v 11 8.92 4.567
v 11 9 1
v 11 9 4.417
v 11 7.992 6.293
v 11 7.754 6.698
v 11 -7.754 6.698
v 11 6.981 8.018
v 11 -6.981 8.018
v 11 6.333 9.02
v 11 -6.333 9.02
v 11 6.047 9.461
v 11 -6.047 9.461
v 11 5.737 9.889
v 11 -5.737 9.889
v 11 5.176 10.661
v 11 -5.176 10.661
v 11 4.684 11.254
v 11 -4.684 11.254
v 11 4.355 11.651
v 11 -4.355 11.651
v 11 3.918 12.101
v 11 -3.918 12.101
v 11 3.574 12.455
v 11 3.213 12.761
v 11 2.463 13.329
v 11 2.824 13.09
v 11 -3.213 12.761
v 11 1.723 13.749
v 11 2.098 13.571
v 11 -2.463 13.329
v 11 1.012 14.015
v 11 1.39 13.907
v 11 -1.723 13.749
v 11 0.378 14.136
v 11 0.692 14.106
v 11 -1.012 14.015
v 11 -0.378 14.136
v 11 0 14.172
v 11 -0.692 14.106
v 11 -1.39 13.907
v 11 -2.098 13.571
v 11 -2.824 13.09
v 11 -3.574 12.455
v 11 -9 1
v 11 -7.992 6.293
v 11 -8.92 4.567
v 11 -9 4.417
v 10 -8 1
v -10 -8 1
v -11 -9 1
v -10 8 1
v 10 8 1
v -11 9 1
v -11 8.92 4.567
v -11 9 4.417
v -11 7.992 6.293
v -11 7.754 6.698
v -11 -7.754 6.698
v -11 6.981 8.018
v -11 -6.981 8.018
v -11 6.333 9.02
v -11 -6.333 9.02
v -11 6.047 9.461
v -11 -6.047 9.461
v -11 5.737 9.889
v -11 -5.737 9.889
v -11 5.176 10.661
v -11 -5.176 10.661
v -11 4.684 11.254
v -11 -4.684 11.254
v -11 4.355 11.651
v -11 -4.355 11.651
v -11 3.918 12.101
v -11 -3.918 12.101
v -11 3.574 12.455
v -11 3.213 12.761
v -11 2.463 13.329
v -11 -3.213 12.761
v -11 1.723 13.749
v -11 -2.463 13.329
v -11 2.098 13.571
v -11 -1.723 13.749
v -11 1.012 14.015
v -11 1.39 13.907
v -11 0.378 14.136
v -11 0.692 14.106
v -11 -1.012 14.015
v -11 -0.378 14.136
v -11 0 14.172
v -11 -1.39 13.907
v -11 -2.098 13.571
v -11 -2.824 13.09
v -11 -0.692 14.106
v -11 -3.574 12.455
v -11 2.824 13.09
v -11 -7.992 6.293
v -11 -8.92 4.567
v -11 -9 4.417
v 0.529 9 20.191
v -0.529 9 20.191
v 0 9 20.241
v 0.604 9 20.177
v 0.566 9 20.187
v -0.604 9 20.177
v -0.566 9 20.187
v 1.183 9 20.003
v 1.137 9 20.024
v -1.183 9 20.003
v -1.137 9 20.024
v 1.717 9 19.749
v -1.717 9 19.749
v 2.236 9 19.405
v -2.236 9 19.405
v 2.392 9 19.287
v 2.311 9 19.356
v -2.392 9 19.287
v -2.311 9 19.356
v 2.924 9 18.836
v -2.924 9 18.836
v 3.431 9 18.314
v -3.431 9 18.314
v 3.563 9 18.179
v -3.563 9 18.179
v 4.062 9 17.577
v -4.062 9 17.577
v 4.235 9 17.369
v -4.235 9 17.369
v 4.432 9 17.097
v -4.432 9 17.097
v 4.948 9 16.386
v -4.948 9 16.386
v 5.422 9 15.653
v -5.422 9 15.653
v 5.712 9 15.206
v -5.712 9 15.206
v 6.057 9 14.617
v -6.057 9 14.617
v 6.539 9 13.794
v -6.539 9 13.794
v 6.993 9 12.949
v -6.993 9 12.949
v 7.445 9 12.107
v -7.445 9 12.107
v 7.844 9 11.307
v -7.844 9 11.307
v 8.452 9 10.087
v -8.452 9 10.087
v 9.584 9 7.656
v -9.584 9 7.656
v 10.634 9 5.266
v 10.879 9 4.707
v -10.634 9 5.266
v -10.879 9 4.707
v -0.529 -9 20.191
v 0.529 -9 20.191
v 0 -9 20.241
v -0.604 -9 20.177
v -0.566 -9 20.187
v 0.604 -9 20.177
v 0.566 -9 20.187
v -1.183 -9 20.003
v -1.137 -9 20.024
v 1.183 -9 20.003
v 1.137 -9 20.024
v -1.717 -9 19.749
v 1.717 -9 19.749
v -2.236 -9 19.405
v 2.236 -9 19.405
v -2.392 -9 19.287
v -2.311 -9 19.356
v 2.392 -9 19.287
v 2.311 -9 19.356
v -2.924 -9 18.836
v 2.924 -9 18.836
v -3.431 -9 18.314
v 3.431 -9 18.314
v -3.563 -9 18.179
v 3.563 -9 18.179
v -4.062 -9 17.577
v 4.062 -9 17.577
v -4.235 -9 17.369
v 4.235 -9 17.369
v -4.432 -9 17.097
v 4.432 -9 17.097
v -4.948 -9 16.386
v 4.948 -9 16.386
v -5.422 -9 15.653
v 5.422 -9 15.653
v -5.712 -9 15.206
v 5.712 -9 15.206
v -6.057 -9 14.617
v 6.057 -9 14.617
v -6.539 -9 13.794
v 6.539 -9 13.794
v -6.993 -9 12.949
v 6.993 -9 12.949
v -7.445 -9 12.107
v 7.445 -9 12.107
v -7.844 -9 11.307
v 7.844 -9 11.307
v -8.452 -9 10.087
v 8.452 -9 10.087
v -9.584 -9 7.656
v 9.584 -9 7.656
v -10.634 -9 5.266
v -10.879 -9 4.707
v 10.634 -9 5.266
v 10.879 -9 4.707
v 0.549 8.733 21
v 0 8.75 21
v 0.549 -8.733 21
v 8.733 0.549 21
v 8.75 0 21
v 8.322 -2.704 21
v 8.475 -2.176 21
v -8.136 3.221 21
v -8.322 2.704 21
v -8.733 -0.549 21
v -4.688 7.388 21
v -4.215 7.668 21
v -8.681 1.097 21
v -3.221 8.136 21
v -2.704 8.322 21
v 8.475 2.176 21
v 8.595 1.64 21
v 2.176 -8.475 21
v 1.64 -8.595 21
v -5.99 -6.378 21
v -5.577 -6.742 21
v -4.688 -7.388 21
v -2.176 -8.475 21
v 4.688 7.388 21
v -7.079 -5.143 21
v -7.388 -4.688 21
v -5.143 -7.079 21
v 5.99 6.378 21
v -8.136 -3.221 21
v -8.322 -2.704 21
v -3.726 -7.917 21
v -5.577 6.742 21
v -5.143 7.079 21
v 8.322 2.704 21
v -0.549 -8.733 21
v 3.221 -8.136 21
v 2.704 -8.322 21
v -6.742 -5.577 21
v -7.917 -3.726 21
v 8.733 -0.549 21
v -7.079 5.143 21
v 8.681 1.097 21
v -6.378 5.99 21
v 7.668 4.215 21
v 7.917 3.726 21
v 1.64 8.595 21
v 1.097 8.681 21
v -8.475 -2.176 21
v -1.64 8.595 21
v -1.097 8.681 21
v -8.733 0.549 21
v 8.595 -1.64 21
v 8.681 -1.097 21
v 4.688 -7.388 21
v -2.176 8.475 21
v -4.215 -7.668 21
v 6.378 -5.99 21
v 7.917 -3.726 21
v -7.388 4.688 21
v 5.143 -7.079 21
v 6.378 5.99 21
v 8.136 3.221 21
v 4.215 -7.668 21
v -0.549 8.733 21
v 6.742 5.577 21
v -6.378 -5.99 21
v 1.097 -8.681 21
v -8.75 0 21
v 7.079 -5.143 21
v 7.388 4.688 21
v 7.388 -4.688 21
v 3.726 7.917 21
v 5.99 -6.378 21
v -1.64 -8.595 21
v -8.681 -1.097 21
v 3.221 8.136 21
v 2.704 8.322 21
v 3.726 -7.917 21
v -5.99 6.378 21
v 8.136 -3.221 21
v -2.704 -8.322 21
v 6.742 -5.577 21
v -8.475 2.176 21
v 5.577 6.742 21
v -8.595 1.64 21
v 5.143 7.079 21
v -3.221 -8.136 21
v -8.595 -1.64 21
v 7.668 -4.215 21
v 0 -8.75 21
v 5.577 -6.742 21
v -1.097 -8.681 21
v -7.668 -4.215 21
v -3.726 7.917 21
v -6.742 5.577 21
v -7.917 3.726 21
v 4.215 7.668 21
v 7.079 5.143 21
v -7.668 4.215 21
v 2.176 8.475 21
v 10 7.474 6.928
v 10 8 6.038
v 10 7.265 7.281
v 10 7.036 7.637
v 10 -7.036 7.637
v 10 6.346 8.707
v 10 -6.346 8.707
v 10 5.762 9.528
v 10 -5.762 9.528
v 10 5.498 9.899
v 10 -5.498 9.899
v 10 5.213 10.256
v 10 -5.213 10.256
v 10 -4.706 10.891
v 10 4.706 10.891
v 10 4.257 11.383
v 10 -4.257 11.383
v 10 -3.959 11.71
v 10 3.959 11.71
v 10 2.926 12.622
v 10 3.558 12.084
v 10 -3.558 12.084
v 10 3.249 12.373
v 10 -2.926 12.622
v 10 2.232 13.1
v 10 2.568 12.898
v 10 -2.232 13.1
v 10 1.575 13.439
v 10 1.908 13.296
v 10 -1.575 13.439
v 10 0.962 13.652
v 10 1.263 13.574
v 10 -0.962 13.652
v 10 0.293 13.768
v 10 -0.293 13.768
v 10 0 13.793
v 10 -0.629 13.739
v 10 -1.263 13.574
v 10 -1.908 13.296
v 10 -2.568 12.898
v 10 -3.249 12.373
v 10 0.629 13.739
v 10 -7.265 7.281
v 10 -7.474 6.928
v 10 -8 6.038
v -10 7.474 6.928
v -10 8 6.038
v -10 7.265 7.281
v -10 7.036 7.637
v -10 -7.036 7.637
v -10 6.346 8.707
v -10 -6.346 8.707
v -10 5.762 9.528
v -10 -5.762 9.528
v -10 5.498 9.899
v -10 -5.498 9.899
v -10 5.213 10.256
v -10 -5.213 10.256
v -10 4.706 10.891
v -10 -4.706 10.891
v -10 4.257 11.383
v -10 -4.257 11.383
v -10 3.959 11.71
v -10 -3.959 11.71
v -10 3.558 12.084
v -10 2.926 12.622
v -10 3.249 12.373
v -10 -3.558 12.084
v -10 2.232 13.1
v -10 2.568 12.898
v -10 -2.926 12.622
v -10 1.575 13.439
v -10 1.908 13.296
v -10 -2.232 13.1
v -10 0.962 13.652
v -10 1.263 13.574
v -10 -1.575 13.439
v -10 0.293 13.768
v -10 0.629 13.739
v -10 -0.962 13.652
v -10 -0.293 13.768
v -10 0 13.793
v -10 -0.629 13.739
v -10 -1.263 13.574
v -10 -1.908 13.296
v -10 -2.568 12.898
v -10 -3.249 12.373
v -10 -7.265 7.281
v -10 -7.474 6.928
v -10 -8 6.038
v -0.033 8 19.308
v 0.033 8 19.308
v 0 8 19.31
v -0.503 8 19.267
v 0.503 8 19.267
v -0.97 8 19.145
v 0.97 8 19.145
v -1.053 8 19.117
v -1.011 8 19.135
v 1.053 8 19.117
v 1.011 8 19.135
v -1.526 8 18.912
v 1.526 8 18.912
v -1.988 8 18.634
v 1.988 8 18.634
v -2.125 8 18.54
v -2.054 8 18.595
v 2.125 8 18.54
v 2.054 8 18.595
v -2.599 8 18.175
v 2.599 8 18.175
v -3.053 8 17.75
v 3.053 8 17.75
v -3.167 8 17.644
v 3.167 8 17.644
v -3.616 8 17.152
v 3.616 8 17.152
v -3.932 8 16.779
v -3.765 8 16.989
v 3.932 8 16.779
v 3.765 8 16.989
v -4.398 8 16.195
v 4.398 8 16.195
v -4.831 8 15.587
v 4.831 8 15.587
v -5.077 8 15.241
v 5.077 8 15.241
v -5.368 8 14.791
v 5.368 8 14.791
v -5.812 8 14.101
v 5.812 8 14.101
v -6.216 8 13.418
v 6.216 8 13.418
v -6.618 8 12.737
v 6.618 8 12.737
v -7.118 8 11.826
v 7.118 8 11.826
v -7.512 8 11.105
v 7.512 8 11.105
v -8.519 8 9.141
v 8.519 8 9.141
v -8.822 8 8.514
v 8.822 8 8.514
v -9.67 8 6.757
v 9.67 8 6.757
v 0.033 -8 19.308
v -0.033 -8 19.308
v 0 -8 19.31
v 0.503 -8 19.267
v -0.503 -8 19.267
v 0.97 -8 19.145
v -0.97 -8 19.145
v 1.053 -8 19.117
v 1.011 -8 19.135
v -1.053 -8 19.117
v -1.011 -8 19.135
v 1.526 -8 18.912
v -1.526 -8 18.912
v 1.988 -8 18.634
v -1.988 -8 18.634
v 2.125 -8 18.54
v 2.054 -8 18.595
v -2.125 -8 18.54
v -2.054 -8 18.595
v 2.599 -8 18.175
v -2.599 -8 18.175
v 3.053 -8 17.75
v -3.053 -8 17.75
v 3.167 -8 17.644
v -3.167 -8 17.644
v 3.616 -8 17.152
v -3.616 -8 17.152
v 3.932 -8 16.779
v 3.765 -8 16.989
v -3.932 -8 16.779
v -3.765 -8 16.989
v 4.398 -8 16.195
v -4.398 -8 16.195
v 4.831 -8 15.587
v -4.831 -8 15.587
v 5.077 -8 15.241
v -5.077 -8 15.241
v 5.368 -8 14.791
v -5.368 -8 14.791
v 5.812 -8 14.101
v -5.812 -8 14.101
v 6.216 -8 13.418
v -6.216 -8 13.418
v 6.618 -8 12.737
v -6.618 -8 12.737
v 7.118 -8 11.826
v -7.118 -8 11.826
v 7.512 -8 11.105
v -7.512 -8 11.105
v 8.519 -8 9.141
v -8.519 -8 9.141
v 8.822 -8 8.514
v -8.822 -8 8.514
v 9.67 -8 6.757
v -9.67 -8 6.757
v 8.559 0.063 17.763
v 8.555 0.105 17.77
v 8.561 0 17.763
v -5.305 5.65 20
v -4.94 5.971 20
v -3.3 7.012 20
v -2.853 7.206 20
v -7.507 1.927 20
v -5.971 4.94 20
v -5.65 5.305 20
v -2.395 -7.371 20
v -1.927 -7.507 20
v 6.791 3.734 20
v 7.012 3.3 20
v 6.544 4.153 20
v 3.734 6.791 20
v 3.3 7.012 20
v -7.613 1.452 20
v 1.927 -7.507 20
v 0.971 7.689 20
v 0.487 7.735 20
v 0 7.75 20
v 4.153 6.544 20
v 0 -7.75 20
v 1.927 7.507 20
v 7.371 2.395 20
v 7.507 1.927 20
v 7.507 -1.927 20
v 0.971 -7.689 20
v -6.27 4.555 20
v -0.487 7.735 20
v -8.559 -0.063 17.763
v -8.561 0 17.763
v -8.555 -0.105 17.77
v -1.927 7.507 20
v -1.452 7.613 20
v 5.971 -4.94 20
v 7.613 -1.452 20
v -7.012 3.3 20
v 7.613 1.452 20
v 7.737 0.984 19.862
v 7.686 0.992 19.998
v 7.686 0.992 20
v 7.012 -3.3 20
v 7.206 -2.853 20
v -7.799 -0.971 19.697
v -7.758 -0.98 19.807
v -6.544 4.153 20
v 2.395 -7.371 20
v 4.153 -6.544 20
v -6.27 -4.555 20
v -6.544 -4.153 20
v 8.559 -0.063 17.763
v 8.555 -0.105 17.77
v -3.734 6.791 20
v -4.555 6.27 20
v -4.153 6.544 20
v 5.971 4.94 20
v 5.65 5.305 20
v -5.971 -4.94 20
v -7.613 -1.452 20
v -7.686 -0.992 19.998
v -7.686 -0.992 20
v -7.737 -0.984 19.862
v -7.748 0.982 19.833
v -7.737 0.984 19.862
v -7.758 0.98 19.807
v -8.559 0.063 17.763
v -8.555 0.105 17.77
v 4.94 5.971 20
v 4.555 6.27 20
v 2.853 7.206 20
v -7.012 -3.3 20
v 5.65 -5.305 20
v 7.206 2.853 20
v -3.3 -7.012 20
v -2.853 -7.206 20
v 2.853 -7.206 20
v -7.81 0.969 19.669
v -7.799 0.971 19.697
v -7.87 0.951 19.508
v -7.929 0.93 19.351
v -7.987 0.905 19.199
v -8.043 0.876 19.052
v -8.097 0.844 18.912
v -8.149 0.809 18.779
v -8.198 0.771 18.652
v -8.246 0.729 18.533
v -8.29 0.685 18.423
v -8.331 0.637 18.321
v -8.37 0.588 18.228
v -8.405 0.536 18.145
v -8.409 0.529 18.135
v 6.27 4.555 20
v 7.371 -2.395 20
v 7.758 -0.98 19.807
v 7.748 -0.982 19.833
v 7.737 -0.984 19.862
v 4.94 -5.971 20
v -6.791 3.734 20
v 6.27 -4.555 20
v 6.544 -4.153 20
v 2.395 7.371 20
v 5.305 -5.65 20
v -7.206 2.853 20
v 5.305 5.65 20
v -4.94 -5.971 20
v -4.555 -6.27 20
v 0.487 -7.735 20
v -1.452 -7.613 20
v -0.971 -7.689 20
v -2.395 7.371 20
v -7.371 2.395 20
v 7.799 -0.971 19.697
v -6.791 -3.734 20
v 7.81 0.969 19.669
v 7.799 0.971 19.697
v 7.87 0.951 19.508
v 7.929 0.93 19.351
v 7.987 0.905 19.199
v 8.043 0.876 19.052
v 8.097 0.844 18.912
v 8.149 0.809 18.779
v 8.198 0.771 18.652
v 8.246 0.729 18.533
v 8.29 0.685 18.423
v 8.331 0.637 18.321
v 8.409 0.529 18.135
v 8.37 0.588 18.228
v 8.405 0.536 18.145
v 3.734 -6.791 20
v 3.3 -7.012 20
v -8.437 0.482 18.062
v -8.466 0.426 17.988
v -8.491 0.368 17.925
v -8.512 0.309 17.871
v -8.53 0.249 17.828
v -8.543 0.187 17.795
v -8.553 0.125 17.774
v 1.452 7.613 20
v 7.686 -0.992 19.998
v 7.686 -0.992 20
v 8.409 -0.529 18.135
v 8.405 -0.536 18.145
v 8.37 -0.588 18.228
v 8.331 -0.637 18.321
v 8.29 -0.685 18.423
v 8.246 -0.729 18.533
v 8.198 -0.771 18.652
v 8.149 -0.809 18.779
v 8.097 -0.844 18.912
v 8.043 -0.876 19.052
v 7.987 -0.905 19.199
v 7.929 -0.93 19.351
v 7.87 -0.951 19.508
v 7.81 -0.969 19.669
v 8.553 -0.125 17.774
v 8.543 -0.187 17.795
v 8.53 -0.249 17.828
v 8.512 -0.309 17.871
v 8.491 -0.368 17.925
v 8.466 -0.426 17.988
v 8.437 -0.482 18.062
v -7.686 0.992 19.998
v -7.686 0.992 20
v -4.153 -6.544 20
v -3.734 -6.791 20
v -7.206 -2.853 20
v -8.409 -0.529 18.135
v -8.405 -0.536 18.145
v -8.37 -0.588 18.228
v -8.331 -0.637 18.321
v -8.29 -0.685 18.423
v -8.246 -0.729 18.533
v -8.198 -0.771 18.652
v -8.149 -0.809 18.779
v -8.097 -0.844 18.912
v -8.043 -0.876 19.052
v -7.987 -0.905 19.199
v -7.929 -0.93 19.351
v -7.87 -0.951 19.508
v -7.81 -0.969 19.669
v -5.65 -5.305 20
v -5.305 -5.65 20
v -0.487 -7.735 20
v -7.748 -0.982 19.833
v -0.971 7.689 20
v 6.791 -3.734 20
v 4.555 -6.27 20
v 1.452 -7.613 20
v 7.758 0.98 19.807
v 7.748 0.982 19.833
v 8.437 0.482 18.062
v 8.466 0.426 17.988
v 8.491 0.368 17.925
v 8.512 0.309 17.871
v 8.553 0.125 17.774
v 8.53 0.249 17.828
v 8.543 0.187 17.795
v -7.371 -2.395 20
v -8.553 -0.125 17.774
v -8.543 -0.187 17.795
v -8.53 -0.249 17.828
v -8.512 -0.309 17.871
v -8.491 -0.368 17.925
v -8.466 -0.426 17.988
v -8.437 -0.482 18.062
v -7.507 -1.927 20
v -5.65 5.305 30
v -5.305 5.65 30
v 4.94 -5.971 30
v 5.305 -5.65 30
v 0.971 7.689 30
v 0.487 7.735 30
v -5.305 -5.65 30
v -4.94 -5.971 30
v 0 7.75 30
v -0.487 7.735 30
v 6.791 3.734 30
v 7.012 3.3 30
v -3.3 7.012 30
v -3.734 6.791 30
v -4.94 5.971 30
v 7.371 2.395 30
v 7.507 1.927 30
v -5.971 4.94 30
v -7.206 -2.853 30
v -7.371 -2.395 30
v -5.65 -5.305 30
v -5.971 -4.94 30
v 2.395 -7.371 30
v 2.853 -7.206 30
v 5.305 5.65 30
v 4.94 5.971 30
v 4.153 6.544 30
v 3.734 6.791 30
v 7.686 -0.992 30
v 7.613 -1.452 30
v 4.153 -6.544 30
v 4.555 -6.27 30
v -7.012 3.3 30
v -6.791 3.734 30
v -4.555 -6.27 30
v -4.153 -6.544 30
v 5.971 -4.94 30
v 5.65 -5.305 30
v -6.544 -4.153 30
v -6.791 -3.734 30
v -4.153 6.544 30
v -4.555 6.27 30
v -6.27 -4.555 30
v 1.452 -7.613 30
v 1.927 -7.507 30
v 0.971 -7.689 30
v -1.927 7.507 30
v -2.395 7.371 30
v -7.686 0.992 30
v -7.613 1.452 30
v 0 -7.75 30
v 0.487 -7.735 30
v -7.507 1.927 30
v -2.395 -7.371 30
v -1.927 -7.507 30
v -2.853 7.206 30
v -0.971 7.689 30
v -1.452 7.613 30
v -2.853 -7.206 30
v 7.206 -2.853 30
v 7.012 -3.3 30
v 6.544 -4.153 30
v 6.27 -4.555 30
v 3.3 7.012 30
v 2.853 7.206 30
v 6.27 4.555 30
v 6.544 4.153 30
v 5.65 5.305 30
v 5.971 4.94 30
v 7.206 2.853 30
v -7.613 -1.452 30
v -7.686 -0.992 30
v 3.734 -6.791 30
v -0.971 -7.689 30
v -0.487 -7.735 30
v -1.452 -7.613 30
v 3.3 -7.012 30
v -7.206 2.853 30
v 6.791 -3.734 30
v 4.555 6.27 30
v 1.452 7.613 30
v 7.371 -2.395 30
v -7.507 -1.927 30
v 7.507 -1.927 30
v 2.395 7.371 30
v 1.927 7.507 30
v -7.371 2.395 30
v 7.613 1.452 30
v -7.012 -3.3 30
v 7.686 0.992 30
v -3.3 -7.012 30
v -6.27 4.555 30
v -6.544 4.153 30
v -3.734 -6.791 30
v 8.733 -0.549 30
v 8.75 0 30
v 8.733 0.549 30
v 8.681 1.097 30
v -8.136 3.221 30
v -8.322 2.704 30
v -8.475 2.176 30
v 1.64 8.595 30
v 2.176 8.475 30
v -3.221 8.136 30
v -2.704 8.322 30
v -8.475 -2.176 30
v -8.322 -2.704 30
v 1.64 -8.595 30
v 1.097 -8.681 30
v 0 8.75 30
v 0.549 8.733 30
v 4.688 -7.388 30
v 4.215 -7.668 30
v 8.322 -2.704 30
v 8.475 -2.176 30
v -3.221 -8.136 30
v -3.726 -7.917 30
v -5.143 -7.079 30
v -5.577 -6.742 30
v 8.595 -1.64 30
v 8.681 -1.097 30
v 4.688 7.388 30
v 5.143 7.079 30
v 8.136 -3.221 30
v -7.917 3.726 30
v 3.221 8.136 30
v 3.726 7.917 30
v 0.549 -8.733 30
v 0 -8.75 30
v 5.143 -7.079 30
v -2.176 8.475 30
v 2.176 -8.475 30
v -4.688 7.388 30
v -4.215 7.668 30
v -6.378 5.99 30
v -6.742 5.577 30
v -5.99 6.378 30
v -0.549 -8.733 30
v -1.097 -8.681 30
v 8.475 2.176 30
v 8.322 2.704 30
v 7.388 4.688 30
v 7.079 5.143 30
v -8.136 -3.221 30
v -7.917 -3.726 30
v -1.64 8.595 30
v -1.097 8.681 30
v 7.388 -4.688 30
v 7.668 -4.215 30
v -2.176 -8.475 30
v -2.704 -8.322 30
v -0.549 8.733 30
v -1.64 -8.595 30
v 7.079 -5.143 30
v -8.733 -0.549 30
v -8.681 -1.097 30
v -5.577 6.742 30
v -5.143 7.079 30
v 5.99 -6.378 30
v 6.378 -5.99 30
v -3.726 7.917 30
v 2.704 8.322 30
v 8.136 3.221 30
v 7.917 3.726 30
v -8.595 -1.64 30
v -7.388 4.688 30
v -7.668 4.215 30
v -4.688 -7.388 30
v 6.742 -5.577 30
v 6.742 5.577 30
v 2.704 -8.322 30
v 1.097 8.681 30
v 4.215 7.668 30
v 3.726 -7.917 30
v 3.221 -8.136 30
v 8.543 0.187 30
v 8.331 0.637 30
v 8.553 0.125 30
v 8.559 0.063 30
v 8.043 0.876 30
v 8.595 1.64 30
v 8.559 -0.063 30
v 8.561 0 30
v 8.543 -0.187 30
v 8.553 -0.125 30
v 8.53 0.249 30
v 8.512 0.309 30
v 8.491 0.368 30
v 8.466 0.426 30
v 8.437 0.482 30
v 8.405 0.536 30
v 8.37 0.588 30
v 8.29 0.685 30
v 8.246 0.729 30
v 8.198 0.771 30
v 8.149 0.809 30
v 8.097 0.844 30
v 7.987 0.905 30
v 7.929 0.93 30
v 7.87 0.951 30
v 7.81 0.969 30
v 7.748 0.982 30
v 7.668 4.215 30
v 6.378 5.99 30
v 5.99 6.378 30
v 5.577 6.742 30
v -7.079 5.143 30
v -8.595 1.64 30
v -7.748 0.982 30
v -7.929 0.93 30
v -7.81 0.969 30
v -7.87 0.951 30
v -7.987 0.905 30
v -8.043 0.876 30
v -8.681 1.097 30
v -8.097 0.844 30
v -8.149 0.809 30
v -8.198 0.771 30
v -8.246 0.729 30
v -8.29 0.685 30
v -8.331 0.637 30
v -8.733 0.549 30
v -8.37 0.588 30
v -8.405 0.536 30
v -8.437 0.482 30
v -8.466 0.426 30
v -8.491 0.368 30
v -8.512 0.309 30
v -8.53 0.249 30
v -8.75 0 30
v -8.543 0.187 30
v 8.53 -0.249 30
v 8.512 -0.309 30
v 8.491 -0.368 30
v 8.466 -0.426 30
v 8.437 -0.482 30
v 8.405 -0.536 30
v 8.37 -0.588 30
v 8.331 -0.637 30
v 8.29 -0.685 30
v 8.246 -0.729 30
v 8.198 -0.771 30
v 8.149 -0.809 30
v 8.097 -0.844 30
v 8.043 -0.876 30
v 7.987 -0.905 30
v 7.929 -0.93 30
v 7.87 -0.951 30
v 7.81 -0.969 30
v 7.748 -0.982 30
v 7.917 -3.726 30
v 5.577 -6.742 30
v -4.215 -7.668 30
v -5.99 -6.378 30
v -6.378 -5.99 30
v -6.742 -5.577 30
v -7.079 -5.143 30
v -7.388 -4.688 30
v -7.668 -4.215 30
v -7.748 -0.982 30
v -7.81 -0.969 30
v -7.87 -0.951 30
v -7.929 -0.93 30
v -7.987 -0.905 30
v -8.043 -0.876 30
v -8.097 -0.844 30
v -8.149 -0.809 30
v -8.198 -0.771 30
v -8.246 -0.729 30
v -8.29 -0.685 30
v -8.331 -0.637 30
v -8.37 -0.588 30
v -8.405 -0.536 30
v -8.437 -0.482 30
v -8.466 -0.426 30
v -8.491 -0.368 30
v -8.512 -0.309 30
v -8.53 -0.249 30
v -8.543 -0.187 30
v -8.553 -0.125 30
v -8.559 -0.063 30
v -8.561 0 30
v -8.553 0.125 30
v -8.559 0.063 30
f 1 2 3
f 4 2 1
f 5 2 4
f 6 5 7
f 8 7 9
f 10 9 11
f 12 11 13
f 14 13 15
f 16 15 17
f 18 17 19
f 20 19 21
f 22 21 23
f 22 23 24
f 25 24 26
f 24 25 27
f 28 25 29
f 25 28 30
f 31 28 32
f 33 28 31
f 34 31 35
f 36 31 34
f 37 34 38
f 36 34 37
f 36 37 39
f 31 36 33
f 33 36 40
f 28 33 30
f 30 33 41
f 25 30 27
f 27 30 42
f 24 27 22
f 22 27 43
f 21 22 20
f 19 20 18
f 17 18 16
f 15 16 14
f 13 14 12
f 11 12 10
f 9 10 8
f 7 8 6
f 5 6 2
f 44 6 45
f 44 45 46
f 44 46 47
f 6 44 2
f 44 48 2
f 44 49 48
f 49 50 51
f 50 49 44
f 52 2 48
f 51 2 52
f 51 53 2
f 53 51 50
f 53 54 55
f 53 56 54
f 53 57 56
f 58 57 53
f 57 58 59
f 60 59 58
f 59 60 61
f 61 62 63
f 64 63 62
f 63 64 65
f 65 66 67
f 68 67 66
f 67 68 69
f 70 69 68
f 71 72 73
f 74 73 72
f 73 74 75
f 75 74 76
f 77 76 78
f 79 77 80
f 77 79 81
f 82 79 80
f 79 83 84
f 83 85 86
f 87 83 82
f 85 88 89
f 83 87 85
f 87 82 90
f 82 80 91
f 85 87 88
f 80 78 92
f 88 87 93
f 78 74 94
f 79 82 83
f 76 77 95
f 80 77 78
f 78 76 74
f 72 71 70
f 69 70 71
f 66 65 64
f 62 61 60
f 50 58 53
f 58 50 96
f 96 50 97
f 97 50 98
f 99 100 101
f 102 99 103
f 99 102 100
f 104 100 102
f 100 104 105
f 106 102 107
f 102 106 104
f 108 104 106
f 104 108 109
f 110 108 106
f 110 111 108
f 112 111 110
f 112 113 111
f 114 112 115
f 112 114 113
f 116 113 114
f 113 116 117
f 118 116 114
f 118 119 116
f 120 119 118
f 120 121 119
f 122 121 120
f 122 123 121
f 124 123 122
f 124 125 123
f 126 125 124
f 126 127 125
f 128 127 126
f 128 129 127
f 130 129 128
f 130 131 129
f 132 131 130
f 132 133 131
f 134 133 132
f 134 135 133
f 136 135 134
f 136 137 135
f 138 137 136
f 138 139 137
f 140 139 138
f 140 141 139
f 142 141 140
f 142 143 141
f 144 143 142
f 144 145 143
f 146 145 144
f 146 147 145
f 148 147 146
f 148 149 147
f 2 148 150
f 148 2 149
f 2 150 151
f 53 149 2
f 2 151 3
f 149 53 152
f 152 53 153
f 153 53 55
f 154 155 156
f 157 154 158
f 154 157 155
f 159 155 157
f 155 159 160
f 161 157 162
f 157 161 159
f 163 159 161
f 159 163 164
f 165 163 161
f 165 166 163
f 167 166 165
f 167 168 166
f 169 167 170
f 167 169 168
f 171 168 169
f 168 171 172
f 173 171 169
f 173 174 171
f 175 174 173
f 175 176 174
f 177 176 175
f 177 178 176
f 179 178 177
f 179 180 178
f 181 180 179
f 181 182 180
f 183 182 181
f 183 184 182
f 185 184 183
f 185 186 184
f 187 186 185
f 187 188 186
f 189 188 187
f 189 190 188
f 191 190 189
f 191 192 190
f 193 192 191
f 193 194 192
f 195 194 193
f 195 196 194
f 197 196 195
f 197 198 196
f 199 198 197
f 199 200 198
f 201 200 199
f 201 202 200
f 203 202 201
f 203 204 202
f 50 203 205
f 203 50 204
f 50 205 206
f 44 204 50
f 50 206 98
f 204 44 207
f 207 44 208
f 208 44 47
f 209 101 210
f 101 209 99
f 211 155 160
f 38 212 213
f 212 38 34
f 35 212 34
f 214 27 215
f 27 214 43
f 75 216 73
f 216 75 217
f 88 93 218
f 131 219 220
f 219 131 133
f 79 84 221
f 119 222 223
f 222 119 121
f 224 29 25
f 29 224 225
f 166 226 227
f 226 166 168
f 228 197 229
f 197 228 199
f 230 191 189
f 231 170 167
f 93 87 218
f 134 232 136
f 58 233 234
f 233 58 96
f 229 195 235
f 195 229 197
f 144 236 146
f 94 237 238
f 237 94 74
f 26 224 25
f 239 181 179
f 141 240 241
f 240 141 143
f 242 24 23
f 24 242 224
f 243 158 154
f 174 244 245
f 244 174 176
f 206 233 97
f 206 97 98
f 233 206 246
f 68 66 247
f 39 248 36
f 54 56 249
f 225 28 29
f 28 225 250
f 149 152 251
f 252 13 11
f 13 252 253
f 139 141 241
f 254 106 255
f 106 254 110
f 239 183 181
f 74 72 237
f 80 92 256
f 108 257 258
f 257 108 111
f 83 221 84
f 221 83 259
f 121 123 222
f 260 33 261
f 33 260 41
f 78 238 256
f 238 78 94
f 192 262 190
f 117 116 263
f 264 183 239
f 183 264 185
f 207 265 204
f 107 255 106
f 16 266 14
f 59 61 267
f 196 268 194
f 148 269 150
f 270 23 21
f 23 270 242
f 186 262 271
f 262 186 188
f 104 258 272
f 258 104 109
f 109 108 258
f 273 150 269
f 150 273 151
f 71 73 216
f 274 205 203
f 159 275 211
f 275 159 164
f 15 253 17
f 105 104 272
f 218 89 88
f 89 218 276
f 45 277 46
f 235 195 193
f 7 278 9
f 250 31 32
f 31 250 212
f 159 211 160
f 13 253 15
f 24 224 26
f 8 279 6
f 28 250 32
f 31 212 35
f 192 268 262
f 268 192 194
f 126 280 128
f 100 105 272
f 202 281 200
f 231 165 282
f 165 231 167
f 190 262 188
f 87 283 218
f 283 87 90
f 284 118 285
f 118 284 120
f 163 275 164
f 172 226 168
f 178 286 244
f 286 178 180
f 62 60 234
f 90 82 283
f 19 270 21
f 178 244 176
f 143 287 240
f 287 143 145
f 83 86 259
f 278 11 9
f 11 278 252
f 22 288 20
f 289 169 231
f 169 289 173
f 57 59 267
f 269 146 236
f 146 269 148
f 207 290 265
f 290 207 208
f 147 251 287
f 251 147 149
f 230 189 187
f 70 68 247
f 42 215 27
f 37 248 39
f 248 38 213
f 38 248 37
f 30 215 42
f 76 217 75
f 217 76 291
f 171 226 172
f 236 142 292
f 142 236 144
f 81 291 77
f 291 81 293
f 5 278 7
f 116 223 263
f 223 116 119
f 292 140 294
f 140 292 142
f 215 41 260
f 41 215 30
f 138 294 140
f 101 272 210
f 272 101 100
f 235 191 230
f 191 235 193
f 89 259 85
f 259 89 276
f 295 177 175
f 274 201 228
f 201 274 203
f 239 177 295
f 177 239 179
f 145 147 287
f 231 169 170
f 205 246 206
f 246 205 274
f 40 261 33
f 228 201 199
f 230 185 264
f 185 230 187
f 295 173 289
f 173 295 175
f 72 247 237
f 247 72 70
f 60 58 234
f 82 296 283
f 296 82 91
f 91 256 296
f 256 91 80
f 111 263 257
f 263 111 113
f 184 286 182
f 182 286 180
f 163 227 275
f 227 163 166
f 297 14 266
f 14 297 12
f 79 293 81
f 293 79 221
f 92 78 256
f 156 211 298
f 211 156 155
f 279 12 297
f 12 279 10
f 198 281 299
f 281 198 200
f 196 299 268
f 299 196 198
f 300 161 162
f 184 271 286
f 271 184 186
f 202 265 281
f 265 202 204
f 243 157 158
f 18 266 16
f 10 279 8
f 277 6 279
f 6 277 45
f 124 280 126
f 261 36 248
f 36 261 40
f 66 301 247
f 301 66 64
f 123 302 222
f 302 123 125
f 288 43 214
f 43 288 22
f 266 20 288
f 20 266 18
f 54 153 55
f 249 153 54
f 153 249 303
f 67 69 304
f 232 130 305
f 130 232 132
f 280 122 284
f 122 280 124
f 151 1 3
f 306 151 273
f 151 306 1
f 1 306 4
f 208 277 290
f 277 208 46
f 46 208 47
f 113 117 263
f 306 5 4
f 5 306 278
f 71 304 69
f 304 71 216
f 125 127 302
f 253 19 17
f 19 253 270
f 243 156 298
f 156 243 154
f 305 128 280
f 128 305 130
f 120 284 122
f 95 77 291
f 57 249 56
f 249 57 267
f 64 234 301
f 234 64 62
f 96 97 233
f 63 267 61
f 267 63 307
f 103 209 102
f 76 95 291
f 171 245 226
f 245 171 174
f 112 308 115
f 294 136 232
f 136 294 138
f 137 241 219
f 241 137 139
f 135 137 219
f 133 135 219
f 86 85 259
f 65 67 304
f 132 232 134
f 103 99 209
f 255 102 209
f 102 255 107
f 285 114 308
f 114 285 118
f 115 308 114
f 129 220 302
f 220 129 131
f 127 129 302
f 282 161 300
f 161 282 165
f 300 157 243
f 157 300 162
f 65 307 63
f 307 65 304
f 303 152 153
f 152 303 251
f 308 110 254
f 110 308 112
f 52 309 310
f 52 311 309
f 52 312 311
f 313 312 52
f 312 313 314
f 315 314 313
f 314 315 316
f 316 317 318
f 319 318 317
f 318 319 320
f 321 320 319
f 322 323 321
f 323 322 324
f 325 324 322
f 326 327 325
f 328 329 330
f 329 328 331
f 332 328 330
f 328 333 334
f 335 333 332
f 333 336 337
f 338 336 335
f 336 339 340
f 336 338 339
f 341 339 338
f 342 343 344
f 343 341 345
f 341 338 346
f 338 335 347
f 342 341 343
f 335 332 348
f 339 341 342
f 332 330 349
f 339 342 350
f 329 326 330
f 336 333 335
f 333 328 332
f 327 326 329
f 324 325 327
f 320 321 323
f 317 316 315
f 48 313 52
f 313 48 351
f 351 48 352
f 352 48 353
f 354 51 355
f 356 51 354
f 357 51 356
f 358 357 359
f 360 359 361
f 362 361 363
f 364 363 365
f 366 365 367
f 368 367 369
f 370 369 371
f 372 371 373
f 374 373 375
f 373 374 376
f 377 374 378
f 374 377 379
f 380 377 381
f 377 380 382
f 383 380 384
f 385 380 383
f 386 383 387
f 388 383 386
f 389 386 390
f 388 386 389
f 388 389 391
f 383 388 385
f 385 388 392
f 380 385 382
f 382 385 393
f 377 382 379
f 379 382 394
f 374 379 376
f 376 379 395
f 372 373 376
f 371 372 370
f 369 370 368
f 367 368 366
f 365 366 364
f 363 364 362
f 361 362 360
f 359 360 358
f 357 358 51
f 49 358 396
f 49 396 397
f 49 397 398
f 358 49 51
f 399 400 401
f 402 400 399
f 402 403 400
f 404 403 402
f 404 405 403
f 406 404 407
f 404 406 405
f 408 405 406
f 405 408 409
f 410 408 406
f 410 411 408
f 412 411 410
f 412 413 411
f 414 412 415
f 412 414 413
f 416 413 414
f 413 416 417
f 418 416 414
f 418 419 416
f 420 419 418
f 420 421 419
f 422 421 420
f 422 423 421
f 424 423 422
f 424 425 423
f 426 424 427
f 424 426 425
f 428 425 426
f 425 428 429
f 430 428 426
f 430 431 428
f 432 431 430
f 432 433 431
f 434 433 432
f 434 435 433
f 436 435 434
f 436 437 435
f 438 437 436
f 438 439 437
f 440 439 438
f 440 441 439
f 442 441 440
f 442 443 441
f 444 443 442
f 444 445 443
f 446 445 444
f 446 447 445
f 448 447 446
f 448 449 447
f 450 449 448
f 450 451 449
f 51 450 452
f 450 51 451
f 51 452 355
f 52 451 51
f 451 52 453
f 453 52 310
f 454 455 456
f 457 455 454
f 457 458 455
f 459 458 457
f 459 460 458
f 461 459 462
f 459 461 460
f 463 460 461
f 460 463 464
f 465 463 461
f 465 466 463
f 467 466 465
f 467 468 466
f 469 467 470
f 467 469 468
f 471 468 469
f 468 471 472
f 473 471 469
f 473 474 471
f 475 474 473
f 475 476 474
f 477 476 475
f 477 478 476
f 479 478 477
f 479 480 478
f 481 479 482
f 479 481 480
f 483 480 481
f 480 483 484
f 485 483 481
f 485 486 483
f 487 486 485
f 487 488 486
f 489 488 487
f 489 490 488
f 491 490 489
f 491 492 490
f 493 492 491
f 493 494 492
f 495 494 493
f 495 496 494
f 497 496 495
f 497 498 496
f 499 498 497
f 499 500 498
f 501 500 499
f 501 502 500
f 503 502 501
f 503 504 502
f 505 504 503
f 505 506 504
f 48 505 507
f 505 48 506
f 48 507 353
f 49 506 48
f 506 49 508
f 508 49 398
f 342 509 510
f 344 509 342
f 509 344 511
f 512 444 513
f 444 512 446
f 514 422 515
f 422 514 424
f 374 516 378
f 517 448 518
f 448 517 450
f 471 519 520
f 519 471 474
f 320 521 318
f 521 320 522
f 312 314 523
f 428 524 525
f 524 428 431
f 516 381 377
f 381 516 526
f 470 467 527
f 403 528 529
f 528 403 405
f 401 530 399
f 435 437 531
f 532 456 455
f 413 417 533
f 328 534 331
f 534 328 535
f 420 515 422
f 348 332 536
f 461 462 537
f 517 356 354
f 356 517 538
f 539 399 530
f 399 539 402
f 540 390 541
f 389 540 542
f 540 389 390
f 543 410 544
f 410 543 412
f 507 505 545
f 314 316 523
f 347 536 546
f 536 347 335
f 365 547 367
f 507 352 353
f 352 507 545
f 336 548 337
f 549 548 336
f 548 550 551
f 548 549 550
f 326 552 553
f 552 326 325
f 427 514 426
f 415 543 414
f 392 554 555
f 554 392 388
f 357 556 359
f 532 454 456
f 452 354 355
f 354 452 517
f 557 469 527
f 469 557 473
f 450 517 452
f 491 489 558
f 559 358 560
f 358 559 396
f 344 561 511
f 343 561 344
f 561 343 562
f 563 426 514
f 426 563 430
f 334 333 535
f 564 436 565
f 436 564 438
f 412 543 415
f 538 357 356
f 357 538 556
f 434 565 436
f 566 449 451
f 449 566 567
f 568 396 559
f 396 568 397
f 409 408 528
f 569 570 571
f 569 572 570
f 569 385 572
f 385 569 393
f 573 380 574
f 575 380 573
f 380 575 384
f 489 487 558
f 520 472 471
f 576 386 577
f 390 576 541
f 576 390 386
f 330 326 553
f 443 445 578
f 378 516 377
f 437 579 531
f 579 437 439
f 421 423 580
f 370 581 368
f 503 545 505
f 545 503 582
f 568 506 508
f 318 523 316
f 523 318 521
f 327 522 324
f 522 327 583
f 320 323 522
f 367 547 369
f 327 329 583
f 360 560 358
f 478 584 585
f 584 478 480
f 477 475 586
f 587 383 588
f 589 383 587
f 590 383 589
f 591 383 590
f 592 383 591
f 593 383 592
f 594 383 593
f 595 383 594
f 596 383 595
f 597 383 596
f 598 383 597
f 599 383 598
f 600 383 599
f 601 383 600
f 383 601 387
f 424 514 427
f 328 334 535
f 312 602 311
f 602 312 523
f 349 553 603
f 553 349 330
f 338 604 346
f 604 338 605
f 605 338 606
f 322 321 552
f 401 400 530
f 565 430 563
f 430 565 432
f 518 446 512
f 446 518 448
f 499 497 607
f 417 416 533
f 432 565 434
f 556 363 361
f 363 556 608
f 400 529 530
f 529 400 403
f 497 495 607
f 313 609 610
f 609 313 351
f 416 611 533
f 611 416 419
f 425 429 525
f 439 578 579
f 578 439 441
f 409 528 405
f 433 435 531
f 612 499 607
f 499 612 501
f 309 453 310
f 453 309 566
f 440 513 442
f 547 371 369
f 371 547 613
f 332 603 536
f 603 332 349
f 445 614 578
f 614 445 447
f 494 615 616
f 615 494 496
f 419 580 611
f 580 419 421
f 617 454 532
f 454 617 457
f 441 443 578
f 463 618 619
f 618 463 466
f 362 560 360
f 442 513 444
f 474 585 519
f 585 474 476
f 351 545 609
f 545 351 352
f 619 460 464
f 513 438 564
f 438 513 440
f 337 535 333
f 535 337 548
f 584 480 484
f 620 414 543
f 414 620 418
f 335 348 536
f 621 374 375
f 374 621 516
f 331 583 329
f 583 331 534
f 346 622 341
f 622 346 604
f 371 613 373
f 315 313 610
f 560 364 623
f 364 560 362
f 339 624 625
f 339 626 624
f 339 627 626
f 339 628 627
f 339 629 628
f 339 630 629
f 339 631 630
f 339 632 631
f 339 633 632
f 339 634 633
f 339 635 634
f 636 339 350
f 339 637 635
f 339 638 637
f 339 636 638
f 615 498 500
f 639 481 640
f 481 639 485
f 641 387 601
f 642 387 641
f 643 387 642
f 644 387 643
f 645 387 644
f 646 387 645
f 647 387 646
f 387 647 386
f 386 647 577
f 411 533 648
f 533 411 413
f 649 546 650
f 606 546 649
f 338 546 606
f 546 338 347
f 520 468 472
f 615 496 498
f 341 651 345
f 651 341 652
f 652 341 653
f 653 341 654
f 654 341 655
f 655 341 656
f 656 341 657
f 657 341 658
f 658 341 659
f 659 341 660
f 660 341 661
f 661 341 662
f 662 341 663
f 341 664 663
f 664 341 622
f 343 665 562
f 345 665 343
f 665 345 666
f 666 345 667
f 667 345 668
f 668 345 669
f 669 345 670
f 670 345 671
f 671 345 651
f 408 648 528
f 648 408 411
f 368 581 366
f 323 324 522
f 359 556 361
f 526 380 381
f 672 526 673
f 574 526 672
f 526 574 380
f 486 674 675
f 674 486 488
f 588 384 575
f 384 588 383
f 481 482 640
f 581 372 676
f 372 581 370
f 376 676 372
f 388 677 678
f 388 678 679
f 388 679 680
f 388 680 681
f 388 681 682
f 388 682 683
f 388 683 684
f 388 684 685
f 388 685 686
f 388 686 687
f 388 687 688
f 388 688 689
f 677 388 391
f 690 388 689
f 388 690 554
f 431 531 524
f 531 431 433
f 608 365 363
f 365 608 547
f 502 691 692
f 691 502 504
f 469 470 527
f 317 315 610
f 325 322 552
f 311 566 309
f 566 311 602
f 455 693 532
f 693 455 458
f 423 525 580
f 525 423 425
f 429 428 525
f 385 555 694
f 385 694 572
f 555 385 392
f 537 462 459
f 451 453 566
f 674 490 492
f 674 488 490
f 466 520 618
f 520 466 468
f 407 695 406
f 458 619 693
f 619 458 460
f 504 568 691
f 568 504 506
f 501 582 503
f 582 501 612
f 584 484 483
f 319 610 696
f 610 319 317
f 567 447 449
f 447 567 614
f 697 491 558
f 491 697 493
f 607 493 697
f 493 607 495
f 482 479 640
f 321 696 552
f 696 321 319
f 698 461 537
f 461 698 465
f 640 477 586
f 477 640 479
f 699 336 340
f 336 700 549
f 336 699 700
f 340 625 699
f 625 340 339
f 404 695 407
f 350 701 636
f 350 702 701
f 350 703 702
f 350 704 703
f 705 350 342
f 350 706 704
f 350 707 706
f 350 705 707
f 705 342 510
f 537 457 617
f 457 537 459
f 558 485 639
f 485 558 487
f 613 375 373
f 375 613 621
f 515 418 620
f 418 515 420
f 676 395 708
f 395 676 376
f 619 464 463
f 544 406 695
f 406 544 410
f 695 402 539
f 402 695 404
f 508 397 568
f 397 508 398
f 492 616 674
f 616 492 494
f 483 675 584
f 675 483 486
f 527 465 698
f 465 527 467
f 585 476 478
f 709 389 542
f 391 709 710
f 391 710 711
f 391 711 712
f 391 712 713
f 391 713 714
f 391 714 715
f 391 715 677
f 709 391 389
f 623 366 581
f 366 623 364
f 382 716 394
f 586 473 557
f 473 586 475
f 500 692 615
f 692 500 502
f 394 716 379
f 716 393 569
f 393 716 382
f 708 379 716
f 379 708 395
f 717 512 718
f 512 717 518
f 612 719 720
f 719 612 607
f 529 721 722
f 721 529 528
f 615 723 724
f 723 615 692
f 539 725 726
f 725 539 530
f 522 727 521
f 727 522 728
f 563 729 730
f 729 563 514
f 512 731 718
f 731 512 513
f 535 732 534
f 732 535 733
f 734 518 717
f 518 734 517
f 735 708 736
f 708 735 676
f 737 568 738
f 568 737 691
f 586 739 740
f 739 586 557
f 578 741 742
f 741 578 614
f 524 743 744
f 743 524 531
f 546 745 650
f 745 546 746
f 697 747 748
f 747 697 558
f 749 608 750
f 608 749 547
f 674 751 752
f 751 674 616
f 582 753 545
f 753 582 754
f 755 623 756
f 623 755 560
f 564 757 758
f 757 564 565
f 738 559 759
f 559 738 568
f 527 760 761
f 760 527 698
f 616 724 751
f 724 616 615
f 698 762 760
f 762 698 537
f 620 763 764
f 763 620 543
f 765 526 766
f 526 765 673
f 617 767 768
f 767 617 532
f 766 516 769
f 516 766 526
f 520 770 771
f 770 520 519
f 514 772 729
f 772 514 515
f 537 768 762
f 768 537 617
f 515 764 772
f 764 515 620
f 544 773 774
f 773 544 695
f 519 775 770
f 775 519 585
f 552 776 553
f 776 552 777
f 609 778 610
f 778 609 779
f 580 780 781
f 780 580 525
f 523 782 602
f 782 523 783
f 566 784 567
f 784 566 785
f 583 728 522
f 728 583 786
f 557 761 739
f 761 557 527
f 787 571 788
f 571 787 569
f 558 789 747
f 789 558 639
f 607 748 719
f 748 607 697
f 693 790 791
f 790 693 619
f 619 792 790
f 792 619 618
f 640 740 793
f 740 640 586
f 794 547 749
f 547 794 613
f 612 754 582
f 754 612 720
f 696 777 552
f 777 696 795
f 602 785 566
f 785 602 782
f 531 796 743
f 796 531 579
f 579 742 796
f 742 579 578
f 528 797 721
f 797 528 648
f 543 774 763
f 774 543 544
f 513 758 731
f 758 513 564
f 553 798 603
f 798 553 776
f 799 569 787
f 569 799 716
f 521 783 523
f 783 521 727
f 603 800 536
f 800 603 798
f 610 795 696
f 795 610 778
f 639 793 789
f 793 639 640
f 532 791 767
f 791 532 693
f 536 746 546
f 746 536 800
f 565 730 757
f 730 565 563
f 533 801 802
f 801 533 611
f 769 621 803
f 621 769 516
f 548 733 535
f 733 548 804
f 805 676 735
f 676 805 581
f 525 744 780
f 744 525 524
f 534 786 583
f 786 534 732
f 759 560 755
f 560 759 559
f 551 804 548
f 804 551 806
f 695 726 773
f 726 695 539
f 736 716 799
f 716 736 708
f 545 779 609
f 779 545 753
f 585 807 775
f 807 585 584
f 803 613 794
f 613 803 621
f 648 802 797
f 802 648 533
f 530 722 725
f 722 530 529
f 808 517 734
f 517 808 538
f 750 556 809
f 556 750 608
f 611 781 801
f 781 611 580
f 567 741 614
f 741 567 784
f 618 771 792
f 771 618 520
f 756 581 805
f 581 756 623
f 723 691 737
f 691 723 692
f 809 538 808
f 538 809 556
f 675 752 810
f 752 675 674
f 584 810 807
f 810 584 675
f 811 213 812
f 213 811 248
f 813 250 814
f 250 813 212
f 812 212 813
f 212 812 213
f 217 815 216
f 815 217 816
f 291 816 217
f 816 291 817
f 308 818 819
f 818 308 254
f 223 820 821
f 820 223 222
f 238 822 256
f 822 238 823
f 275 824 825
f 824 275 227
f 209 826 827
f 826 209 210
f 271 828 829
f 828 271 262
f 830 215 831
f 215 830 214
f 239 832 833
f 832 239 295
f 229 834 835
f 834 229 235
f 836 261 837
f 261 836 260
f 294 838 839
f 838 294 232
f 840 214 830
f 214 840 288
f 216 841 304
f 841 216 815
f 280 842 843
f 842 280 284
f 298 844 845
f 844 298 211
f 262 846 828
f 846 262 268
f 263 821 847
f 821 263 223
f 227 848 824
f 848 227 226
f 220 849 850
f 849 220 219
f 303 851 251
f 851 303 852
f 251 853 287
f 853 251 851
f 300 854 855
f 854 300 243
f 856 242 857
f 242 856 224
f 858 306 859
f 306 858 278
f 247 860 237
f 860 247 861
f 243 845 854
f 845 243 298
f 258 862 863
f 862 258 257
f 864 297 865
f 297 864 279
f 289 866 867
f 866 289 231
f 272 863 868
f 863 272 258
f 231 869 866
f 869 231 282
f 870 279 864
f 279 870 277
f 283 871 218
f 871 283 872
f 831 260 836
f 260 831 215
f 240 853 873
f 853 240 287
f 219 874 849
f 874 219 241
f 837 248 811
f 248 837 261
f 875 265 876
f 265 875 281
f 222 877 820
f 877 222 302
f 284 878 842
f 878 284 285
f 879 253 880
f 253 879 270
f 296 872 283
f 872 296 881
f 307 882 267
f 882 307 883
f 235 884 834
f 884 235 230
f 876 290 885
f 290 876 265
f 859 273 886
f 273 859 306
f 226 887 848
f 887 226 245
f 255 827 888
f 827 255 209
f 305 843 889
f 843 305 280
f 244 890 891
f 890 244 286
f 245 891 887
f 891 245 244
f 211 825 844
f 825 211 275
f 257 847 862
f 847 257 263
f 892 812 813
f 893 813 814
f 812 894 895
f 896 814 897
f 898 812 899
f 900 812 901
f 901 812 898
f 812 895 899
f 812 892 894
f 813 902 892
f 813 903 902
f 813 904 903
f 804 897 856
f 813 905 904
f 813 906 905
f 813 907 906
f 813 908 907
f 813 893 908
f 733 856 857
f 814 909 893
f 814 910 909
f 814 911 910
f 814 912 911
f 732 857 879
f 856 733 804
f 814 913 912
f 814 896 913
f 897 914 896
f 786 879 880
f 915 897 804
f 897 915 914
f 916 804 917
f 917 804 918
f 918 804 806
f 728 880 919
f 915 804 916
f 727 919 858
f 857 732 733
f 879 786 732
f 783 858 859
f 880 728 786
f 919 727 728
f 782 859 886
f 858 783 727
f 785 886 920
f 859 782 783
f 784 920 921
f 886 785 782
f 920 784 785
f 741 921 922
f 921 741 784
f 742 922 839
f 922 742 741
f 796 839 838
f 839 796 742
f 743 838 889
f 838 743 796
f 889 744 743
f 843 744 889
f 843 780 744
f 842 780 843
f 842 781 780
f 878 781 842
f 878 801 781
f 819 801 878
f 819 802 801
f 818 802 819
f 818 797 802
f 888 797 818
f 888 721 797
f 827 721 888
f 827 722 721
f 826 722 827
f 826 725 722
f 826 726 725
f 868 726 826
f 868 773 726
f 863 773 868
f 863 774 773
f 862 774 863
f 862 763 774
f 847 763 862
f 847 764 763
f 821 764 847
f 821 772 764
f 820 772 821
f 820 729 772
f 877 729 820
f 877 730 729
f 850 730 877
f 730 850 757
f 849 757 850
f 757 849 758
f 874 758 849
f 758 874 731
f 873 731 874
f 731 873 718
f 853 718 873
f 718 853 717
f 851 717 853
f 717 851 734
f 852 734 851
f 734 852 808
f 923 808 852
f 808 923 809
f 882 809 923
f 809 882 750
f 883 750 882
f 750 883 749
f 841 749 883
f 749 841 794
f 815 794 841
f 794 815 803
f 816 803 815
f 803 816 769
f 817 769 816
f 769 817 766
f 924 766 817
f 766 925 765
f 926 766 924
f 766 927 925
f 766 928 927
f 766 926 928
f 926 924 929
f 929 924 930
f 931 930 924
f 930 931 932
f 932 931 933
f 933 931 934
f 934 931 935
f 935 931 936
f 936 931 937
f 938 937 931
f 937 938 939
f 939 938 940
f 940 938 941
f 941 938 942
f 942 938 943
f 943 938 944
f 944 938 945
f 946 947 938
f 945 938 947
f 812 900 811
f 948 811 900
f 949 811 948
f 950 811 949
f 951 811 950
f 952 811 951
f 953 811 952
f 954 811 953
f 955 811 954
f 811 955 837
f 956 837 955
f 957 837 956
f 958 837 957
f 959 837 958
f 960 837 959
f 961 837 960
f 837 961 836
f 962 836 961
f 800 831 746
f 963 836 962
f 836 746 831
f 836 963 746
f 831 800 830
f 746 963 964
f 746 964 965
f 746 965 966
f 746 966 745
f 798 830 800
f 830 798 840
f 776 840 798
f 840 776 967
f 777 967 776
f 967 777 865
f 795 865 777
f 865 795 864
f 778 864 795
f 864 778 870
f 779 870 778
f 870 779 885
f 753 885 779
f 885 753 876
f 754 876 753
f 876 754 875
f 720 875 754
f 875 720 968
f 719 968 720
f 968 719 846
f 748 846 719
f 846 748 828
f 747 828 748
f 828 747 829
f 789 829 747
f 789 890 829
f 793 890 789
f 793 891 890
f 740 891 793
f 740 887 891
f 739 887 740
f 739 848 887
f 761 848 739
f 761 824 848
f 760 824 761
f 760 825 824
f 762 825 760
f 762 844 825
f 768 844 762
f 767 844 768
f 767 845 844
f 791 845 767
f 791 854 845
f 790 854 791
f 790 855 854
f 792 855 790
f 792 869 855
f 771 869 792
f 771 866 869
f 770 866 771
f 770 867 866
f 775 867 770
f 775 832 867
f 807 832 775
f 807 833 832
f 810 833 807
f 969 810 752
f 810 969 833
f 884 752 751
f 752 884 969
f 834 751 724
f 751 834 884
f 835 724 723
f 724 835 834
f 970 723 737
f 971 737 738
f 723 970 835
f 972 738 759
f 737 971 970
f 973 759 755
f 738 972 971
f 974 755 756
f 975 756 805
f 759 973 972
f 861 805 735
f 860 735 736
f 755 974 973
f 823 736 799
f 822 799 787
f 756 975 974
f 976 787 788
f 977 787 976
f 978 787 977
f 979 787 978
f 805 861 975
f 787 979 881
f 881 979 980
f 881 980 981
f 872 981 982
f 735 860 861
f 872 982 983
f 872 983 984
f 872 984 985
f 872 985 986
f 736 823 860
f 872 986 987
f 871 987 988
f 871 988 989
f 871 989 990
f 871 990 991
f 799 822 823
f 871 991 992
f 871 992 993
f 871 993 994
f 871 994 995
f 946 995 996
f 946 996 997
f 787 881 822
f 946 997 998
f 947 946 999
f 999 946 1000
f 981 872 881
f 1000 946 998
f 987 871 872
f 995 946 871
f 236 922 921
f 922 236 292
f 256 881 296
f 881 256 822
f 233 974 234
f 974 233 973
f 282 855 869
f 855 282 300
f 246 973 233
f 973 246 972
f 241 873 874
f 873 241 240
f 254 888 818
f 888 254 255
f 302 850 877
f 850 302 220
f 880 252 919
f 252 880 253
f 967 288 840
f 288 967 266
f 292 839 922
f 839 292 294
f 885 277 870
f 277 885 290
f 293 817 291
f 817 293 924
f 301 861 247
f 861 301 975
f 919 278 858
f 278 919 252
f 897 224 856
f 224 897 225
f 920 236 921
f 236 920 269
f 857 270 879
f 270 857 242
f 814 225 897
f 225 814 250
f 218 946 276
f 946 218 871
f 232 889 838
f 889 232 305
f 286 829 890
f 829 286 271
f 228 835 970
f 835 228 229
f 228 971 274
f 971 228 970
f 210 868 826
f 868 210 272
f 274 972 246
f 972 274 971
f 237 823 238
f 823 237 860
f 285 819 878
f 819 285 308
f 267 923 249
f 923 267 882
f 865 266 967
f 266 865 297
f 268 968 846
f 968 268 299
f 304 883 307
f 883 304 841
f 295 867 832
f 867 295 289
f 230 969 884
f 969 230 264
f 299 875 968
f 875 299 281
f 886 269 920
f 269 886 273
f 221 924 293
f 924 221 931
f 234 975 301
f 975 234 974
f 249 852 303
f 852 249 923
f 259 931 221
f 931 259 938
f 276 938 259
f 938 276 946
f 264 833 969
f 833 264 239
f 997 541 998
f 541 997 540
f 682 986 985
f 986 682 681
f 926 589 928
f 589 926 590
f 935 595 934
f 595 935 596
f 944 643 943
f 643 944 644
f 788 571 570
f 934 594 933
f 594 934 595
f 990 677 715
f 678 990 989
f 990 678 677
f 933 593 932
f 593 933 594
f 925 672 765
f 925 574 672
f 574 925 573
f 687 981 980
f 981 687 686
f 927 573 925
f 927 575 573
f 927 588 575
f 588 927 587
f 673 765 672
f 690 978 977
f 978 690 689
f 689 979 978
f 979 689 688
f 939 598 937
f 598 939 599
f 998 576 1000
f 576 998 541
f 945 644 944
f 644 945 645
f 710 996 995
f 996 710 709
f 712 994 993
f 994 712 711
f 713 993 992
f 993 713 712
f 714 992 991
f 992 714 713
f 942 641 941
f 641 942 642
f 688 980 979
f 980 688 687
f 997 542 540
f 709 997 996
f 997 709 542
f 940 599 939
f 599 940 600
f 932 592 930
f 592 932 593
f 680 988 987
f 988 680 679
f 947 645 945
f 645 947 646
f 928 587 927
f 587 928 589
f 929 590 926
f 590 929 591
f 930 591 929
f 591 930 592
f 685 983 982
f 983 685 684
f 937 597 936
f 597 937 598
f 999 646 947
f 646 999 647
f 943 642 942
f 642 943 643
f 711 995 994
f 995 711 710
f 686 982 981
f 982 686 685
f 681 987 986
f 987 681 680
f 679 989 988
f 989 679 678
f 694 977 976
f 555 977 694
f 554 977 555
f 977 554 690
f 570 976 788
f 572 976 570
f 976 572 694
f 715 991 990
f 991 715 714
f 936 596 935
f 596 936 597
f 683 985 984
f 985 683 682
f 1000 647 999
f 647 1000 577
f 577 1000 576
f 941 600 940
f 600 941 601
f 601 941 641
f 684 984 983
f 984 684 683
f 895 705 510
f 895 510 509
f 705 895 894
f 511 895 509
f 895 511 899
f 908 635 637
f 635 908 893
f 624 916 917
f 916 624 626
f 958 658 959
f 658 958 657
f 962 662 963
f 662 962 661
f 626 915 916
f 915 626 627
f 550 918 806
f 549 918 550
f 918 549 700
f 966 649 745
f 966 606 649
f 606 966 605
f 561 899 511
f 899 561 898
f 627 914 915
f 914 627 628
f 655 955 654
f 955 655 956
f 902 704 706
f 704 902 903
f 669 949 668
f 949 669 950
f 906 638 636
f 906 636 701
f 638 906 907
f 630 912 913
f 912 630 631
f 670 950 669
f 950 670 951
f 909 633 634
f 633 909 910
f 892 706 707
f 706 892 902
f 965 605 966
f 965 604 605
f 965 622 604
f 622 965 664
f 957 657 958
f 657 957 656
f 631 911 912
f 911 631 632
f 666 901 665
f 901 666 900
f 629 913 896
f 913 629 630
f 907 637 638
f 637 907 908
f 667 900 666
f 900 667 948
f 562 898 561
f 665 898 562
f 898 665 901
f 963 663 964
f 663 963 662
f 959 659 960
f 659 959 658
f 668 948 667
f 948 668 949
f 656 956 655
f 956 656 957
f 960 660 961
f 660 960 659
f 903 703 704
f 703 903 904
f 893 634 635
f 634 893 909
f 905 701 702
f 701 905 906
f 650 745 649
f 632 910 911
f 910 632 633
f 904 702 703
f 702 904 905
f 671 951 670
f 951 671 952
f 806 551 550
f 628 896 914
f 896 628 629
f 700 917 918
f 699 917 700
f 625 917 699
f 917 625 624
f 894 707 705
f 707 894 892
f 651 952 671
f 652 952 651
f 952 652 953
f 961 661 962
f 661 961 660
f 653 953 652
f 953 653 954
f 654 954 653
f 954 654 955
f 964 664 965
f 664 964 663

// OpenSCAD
$fn = $preview ? 30 : 100;

wall = 1;
d_inside = 15.5;

// difference() {
// 	cube(size=[20 + 2 * wall, 16 + 2 * wall, 5], center=true);
// }

module inner(wall=0) {
	intersection() {
		translate([0, 0, 15 + 2 * wall])
			cube(size=[20 + 2 * wall, 16 + 2 * wall, 30 + 2 * wall], center=true);
		translate([0, 0, 10])
			cylinder(h=20 + 2 * wall, d1=30 + 2 * wall, d2=d_inside + 2 * wall, center=true);
	}
}

module shell() {
	difference() {
		inner(1);
		inner(0);
		cylinder(h=50, d=d_inside, center=true);
	}

	translate([0, 0, 25]) {
		difference() {
			cylinder(h=10, d=d_inside + 2 * wall, center=true);
			cylinder(h=50, d=d_inside, center=true);
		}
	}
}

difference() {
	shell();
	for (i=[-1, 1]) {
		translate([i * d_inside / 2.05, 0, 25])
			cylinder(h=50, d=2, center=true);
	}
}
